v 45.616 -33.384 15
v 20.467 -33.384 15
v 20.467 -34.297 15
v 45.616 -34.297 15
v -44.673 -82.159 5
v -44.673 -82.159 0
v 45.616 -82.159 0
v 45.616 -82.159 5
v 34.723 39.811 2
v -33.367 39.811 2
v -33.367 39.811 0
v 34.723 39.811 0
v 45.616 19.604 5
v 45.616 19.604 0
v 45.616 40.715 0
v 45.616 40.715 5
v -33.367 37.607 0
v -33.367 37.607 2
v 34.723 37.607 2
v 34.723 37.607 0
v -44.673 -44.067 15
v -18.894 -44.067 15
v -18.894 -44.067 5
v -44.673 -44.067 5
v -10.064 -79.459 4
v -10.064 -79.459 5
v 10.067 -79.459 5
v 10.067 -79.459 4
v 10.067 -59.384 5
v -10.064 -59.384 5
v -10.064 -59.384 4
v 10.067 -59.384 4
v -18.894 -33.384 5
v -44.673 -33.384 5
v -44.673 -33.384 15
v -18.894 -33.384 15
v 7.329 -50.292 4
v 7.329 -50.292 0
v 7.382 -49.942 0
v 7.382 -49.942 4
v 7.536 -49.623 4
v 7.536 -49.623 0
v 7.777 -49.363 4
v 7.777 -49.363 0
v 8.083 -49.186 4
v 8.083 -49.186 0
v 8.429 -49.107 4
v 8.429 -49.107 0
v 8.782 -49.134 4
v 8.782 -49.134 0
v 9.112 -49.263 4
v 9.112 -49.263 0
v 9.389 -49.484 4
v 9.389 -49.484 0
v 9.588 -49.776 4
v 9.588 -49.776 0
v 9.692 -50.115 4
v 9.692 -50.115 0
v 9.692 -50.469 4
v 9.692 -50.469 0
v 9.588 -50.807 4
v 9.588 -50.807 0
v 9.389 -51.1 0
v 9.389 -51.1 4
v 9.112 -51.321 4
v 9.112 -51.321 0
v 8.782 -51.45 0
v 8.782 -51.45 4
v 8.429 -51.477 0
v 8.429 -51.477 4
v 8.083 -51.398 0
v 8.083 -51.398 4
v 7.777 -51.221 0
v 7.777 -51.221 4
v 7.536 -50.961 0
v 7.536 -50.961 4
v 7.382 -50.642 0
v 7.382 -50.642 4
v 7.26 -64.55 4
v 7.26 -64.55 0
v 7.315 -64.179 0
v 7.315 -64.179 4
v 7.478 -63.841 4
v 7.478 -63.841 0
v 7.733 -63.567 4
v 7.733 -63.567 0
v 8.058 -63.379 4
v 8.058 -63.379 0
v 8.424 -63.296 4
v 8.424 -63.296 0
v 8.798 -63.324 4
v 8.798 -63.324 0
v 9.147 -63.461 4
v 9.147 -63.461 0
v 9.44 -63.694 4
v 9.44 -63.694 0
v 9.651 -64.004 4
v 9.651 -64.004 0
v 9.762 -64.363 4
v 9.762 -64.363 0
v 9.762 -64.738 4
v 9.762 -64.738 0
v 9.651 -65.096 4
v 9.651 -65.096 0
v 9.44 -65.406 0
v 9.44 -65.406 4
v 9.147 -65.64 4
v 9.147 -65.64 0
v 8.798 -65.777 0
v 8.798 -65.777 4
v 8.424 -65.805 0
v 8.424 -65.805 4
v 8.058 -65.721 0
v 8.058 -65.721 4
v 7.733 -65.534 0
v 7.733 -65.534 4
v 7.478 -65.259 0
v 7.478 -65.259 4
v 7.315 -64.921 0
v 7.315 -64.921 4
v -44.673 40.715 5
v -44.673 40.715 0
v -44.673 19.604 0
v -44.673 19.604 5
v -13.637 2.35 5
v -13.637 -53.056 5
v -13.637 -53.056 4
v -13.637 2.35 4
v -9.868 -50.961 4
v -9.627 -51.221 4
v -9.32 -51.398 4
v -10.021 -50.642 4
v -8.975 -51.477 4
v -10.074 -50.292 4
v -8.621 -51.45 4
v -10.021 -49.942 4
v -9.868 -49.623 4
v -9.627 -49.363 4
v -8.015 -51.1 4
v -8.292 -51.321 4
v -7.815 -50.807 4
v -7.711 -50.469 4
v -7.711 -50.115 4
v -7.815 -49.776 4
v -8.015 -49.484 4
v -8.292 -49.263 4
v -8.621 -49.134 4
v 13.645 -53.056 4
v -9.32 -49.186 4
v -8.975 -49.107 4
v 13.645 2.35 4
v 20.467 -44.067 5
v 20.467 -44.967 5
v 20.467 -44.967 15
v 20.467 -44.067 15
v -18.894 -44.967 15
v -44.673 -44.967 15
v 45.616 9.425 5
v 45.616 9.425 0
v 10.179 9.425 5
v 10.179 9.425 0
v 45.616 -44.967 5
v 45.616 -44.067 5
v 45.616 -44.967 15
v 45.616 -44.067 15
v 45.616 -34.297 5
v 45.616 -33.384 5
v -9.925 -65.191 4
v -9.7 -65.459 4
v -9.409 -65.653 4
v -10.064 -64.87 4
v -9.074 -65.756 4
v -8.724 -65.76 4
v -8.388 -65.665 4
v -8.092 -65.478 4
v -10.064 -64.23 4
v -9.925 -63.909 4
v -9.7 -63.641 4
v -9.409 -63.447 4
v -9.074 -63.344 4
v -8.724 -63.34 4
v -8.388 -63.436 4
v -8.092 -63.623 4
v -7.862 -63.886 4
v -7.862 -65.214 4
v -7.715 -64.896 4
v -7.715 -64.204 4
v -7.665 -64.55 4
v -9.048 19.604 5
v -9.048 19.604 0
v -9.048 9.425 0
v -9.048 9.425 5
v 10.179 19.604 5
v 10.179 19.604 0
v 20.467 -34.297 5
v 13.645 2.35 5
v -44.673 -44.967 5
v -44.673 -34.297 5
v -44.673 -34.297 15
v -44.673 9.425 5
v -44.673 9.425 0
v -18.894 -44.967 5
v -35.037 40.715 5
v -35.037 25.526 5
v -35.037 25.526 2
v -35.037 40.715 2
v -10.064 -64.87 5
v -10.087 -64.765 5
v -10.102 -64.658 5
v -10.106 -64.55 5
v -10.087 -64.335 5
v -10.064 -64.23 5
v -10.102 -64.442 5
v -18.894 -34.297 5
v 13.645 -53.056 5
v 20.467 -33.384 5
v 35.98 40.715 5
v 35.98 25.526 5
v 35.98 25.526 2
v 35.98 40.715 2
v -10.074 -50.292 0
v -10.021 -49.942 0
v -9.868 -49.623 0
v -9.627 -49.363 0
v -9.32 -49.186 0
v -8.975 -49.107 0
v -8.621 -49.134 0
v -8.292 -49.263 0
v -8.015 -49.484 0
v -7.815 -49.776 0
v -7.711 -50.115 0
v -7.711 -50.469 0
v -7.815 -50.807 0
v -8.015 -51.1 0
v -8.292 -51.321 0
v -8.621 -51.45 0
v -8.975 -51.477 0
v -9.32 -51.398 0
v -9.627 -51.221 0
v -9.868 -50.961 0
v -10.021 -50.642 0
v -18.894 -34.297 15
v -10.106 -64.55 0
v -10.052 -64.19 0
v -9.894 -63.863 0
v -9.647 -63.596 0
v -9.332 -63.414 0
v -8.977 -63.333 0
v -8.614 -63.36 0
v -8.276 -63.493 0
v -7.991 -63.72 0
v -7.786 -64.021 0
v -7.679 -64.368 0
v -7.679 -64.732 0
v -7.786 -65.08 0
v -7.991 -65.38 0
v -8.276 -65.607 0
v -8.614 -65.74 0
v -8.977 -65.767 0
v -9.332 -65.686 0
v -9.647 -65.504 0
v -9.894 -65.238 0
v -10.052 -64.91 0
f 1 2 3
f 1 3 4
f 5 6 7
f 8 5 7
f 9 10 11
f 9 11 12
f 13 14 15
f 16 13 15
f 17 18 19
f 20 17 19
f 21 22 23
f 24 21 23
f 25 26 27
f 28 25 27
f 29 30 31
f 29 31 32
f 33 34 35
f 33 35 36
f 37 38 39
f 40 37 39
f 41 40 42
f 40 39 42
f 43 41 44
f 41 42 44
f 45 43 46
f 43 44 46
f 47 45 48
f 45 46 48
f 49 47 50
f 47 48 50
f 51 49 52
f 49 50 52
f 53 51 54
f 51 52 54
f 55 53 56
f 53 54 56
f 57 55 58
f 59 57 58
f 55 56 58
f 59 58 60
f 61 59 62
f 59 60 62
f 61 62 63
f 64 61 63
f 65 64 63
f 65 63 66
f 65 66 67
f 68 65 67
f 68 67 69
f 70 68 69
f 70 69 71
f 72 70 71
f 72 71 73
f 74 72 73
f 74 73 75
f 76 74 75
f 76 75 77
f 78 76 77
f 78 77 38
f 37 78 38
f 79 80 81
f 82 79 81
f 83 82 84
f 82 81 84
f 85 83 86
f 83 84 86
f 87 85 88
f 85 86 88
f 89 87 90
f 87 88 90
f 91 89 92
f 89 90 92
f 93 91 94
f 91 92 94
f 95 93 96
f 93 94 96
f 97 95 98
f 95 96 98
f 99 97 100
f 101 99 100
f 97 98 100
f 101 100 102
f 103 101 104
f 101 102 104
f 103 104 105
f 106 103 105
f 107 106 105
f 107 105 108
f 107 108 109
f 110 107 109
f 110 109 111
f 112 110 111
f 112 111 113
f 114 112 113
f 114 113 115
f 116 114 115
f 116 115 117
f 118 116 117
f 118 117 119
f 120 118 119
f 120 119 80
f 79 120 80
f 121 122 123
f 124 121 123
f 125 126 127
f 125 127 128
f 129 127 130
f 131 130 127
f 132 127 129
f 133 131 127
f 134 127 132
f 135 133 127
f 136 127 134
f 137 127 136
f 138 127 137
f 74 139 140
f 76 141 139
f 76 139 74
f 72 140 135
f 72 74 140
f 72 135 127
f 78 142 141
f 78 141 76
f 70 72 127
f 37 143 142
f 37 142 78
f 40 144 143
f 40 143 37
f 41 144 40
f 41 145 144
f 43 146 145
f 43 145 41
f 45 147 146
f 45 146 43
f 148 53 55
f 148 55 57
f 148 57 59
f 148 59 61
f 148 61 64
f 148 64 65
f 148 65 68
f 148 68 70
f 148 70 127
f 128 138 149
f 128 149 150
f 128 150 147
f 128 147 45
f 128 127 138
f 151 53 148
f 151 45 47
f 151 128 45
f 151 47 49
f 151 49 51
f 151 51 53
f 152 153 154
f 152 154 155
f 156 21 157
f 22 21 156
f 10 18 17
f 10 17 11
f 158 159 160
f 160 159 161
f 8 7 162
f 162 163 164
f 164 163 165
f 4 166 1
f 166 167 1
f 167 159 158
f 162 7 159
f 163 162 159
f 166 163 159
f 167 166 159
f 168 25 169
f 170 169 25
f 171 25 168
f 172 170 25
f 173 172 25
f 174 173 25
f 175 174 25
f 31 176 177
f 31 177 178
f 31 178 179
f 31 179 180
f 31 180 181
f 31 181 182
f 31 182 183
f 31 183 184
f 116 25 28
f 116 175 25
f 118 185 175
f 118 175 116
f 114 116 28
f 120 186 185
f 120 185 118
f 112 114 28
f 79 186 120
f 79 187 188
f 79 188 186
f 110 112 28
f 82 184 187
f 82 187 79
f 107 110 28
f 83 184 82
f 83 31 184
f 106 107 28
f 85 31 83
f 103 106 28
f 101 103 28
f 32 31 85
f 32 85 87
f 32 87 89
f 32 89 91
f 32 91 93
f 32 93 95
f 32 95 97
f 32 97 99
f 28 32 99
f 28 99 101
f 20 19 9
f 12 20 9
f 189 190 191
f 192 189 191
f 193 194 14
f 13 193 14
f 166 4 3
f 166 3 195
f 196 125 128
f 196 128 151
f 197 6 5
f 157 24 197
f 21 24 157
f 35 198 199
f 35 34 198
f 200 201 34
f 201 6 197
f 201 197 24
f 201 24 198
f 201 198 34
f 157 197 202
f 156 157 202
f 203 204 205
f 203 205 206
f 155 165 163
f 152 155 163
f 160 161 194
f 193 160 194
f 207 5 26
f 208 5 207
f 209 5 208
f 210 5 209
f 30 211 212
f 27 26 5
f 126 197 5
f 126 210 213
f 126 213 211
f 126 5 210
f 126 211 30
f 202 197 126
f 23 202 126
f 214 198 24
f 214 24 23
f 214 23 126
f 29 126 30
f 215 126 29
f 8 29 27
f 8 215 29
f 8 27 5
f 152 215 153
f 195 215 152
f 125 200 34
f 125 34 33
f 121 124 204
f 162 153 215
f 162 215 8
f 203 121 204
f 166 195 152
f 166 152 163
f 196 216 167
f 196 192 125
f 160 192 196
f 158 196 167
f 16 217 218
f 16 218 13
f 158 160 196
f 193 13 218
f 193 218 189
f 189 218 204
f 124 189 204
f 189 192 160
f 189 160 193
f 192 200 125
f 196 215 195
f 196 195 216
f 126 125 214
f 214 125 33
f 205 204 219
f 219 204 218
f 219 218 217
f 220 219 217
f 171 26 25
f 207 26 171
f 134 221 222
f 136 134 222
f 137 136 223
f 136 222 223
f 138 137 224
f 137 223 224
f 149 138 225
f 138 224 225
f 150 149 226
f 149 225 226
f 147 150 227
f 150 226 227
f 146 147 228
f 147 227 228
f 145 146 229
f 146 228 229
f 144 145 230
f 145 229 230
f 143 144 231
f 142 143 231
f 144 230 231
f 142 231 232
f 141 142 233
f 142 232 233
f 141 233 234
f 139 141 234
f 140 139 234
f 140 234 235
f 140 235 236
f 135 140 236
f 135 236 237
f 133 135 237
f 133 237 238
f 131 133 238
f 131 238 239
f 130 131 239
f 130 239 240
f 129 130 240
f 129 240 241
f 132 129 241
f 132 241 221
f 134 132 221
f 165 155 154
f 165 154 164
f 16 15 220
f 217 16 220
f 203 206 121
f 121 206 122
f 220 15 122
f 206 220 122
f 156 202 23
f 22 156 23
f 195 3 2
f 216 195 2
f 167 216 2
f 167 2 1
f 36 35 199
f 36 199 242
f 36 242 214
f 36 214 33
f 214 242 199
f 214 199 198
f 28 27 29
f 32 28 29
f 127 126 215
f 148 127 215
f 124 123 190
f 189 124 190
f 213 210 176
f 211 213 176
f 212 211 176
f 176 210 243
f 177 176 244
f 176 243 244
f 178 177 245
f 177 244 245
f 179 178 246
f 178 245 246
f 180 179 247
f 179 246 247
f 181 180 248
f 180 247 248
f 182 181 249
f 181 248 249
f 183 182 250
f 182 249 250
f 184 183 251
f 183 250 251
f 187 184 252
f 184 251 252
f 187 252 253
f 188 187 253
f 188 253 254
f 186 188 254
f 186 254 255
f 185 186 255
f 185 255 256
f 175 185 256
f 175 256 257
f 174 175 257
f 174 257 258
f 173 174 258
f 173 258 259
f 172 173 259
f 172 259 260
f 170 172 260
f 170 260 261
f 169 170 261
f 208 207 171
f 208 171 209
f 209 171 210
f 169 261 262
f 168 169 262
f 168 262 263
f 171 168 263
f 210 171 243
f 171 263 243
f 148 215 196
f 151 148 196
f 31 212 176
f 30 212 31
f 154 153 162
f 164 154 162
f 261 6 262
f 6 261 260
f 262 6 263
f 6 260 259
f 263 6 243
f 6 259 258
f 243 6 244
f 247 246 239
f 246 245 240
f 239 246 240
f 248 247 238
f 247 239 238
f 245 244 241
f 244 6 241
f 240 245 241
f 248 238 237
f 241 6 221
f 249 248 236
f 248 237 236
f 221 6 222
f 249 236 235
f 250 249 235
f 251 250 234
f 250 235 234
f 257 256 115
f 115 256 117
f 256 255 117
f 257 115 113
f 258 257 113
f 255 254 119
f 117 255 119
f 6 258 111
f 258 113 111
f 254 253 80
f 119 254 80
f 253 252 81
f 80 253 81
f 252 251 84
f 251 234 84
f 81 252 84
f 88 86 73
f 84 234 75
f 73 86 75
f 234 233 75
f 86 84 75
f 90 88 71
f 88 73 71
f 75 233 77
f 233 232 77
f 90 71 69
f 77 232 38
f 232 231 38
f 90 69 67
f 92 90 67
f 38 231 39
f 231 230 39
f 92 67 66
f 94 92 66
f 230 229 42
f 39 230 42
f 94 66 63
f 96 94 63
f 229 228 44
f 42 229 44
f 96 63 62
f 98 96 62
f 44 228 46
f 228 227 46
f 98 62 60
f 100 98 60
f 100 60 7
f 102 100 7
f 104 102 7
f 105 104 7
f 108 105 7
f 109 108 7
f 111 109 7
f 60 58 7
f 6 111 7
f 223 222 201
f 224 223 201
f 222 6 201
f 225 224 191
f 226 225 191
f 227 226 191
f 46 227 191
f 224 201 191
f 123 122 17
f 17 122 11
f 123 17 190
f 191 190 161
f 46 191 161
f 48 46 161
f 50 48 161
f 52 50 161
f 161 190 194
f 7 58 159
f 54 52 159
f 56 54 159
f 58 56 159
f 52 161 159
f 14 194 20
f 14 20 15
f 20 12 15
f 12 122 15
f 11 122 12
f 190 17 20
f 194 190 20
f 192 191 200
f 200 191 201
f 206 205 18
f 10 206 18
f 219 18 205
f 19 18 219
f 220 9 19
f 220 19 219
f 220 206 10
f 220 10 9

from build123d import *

# Parameters (mm, degrees)
RESSALTO_EXTRUS_O1_DEPTH = 5
ESBO_O2_W                = 71.017341725
ESBO_O2_H                = 15.188699459
CORTE_EXTRUS_O1_DEPTH    = 3
MOVER_FACE1_BY           = 10.718934909
ESBO_O3_W                = 68.089828176
ESBO_O3_H                = 2.204794608
CORTE_EXTRUS_O2_DEPTH    = 10
ESBO_O4_W                = 20.131000956
ESBO_O4_H                = 20.074327354
ESBO_O4_W_2              = 27.282150264
ESBO_O4_H_2              = 55.406342203
CORTE_EXTRUS_O4_DEPTH    = 1
ESBO_O5_R                = 1.188185025
ESBO_O5_R_2              = 1.258078261
ESBO_O5_R_3              = 1.220632904
CORTE_EXTRUS_O5_DEPTH    = 10
ESBO_O6_W                = 25.148684125
ESBO_O6_H                = 11.582759477
ESBO_O6_W_2              = 25.779007711
RESSALTO_EXTRUS_O2_DEPTH = 10
ESBO_O7_W                = 10
ESBO_O7_H                = 9.769511044
CORTE_EXTRUS_O7_DEPTH    = 99


with BuildPart() as part:
    # Esboço1 → Ressalto-extrusão1 (new body)
    with BuildSketch(Plane.XY):
        Polygon((-44.67348187, 40.715072084), (-44.67348187, 19.603553226), (-9.047793796, 19.603553226), (-9.047793796, 9.424785205), (-44.67348187, 9.424785205), (-44.67348187, -71.439871851), (45.61596039, -71.439871851), (45.61596039, 9.424785205), (10.178768021, 9.424785205), (10.178768021, 19.603553226), (45.61596039, 19.603553226), (45.61596039, 40.715072084), align=None)
    extrude(amount=RESSALTO_EXTRUS_O1_DEPTH)

    # Esboço2 → Corte-extrusão1 (cut)
    with BuildSketch(Plane.XY.offset(5)):
        with Locations((0.47123926, 33.120722355)):
            Rectangle(ESBO_O2_W, ESBO_O2_H)
    extrude(amount=-CORTE_EXTRUS_O1_DEPTH, mode=Mode.SUBTRACT)

    # Mover face1: a face moved outward by 10.718935
    extrude(part.faces().sort_by_distance((0.47123926, -71.439871851, 2.5))[0], amount=MOVER_FACE1_BY, dir=(0, -1, 0))

    # Esboço3 → Corte-extrusão2 (cut)
    with BuildSketch(Plane.XY.offset(2)):
        with Locations((0.67810757, 38.709026673)):
            Rectangle(ESBO_O3_W, ESBO_O3_H)
    extrude(amount=-CORTE_EXTRUS_O2_DEPTH, mode=Mode.SUBTRACT)

    # Esboço4 → Corte-extrusão4 (cut)
    with BuildSketch(Plane.XY.offset(5)):
        with Locations((0.001720335, -69.421605448)):
            Rectangle(ESBO_O4_W, ESBO_O4_H)
        with Locations((0.003895482, -25.35309655)):
            Rectangle(ESBO_O4_W_2, ESBO_O4_H_2)
    extrude(amount=-CORTE_EXTRUS_O4_DEPTH, mode=Mode.SUBTRACT)

    # Esboço5 → Corte-extrusão5 (cut)
    with BuildSketch(Plane(origin=(0, 0, 0), x_dir=(-1, 0, 0), z_dir=(0, 0, -1))):
        with Locations((-8.517583176, -50.2919249)):
            Circle(ESBO_O5_R)
        with Locations((-8.517583176, -64.550145197)):
            Circle(ESBO_O5_R_2)
        with Locations((8.885832774, -64.550145197)):
            Circle(ESBO_O5_R_3)
        with Locations((8.885832774, -50.2919249)):
            Circle(ESBO_O5_R)
    extrude(amount=-CORTE_EXTRUS_O5_DEPTH, mode=Mode.SUBTRACT)

    # Esboço6 → Ressalto-extrusão2 (add)
    with BuildSketch(Plane.XY.offset(5)):
        with Locations((33.041618328, -39.175755318)):
            Rectangle(ESBO_O6_W, ESBO_O6_H)
        with Locations((-31.783978015, -39.175755318)):
            Rectangle(ESBO_O6_W_2, ESBO_O6_H)
    extrude(amount=RESSALTO_EXTRUS_O2_DEPTH)

    # Esboço7 → Corte-extrusão7 (cut)
    with BuildSketch(Plane(origin=(45.61596039, 0, 0), x_dir=(0, 0, -1), z_dir=(1, 0, 0))):
        with Locations((-10, -39.181904772)):
            Rectangle(ESBO_O7_W, ESBO_O7_H)
    extrude(amount=-CORTE_EXTRUS_O7_DEPTH, mode=Mode.SUBTRACT)


solid = part.part
